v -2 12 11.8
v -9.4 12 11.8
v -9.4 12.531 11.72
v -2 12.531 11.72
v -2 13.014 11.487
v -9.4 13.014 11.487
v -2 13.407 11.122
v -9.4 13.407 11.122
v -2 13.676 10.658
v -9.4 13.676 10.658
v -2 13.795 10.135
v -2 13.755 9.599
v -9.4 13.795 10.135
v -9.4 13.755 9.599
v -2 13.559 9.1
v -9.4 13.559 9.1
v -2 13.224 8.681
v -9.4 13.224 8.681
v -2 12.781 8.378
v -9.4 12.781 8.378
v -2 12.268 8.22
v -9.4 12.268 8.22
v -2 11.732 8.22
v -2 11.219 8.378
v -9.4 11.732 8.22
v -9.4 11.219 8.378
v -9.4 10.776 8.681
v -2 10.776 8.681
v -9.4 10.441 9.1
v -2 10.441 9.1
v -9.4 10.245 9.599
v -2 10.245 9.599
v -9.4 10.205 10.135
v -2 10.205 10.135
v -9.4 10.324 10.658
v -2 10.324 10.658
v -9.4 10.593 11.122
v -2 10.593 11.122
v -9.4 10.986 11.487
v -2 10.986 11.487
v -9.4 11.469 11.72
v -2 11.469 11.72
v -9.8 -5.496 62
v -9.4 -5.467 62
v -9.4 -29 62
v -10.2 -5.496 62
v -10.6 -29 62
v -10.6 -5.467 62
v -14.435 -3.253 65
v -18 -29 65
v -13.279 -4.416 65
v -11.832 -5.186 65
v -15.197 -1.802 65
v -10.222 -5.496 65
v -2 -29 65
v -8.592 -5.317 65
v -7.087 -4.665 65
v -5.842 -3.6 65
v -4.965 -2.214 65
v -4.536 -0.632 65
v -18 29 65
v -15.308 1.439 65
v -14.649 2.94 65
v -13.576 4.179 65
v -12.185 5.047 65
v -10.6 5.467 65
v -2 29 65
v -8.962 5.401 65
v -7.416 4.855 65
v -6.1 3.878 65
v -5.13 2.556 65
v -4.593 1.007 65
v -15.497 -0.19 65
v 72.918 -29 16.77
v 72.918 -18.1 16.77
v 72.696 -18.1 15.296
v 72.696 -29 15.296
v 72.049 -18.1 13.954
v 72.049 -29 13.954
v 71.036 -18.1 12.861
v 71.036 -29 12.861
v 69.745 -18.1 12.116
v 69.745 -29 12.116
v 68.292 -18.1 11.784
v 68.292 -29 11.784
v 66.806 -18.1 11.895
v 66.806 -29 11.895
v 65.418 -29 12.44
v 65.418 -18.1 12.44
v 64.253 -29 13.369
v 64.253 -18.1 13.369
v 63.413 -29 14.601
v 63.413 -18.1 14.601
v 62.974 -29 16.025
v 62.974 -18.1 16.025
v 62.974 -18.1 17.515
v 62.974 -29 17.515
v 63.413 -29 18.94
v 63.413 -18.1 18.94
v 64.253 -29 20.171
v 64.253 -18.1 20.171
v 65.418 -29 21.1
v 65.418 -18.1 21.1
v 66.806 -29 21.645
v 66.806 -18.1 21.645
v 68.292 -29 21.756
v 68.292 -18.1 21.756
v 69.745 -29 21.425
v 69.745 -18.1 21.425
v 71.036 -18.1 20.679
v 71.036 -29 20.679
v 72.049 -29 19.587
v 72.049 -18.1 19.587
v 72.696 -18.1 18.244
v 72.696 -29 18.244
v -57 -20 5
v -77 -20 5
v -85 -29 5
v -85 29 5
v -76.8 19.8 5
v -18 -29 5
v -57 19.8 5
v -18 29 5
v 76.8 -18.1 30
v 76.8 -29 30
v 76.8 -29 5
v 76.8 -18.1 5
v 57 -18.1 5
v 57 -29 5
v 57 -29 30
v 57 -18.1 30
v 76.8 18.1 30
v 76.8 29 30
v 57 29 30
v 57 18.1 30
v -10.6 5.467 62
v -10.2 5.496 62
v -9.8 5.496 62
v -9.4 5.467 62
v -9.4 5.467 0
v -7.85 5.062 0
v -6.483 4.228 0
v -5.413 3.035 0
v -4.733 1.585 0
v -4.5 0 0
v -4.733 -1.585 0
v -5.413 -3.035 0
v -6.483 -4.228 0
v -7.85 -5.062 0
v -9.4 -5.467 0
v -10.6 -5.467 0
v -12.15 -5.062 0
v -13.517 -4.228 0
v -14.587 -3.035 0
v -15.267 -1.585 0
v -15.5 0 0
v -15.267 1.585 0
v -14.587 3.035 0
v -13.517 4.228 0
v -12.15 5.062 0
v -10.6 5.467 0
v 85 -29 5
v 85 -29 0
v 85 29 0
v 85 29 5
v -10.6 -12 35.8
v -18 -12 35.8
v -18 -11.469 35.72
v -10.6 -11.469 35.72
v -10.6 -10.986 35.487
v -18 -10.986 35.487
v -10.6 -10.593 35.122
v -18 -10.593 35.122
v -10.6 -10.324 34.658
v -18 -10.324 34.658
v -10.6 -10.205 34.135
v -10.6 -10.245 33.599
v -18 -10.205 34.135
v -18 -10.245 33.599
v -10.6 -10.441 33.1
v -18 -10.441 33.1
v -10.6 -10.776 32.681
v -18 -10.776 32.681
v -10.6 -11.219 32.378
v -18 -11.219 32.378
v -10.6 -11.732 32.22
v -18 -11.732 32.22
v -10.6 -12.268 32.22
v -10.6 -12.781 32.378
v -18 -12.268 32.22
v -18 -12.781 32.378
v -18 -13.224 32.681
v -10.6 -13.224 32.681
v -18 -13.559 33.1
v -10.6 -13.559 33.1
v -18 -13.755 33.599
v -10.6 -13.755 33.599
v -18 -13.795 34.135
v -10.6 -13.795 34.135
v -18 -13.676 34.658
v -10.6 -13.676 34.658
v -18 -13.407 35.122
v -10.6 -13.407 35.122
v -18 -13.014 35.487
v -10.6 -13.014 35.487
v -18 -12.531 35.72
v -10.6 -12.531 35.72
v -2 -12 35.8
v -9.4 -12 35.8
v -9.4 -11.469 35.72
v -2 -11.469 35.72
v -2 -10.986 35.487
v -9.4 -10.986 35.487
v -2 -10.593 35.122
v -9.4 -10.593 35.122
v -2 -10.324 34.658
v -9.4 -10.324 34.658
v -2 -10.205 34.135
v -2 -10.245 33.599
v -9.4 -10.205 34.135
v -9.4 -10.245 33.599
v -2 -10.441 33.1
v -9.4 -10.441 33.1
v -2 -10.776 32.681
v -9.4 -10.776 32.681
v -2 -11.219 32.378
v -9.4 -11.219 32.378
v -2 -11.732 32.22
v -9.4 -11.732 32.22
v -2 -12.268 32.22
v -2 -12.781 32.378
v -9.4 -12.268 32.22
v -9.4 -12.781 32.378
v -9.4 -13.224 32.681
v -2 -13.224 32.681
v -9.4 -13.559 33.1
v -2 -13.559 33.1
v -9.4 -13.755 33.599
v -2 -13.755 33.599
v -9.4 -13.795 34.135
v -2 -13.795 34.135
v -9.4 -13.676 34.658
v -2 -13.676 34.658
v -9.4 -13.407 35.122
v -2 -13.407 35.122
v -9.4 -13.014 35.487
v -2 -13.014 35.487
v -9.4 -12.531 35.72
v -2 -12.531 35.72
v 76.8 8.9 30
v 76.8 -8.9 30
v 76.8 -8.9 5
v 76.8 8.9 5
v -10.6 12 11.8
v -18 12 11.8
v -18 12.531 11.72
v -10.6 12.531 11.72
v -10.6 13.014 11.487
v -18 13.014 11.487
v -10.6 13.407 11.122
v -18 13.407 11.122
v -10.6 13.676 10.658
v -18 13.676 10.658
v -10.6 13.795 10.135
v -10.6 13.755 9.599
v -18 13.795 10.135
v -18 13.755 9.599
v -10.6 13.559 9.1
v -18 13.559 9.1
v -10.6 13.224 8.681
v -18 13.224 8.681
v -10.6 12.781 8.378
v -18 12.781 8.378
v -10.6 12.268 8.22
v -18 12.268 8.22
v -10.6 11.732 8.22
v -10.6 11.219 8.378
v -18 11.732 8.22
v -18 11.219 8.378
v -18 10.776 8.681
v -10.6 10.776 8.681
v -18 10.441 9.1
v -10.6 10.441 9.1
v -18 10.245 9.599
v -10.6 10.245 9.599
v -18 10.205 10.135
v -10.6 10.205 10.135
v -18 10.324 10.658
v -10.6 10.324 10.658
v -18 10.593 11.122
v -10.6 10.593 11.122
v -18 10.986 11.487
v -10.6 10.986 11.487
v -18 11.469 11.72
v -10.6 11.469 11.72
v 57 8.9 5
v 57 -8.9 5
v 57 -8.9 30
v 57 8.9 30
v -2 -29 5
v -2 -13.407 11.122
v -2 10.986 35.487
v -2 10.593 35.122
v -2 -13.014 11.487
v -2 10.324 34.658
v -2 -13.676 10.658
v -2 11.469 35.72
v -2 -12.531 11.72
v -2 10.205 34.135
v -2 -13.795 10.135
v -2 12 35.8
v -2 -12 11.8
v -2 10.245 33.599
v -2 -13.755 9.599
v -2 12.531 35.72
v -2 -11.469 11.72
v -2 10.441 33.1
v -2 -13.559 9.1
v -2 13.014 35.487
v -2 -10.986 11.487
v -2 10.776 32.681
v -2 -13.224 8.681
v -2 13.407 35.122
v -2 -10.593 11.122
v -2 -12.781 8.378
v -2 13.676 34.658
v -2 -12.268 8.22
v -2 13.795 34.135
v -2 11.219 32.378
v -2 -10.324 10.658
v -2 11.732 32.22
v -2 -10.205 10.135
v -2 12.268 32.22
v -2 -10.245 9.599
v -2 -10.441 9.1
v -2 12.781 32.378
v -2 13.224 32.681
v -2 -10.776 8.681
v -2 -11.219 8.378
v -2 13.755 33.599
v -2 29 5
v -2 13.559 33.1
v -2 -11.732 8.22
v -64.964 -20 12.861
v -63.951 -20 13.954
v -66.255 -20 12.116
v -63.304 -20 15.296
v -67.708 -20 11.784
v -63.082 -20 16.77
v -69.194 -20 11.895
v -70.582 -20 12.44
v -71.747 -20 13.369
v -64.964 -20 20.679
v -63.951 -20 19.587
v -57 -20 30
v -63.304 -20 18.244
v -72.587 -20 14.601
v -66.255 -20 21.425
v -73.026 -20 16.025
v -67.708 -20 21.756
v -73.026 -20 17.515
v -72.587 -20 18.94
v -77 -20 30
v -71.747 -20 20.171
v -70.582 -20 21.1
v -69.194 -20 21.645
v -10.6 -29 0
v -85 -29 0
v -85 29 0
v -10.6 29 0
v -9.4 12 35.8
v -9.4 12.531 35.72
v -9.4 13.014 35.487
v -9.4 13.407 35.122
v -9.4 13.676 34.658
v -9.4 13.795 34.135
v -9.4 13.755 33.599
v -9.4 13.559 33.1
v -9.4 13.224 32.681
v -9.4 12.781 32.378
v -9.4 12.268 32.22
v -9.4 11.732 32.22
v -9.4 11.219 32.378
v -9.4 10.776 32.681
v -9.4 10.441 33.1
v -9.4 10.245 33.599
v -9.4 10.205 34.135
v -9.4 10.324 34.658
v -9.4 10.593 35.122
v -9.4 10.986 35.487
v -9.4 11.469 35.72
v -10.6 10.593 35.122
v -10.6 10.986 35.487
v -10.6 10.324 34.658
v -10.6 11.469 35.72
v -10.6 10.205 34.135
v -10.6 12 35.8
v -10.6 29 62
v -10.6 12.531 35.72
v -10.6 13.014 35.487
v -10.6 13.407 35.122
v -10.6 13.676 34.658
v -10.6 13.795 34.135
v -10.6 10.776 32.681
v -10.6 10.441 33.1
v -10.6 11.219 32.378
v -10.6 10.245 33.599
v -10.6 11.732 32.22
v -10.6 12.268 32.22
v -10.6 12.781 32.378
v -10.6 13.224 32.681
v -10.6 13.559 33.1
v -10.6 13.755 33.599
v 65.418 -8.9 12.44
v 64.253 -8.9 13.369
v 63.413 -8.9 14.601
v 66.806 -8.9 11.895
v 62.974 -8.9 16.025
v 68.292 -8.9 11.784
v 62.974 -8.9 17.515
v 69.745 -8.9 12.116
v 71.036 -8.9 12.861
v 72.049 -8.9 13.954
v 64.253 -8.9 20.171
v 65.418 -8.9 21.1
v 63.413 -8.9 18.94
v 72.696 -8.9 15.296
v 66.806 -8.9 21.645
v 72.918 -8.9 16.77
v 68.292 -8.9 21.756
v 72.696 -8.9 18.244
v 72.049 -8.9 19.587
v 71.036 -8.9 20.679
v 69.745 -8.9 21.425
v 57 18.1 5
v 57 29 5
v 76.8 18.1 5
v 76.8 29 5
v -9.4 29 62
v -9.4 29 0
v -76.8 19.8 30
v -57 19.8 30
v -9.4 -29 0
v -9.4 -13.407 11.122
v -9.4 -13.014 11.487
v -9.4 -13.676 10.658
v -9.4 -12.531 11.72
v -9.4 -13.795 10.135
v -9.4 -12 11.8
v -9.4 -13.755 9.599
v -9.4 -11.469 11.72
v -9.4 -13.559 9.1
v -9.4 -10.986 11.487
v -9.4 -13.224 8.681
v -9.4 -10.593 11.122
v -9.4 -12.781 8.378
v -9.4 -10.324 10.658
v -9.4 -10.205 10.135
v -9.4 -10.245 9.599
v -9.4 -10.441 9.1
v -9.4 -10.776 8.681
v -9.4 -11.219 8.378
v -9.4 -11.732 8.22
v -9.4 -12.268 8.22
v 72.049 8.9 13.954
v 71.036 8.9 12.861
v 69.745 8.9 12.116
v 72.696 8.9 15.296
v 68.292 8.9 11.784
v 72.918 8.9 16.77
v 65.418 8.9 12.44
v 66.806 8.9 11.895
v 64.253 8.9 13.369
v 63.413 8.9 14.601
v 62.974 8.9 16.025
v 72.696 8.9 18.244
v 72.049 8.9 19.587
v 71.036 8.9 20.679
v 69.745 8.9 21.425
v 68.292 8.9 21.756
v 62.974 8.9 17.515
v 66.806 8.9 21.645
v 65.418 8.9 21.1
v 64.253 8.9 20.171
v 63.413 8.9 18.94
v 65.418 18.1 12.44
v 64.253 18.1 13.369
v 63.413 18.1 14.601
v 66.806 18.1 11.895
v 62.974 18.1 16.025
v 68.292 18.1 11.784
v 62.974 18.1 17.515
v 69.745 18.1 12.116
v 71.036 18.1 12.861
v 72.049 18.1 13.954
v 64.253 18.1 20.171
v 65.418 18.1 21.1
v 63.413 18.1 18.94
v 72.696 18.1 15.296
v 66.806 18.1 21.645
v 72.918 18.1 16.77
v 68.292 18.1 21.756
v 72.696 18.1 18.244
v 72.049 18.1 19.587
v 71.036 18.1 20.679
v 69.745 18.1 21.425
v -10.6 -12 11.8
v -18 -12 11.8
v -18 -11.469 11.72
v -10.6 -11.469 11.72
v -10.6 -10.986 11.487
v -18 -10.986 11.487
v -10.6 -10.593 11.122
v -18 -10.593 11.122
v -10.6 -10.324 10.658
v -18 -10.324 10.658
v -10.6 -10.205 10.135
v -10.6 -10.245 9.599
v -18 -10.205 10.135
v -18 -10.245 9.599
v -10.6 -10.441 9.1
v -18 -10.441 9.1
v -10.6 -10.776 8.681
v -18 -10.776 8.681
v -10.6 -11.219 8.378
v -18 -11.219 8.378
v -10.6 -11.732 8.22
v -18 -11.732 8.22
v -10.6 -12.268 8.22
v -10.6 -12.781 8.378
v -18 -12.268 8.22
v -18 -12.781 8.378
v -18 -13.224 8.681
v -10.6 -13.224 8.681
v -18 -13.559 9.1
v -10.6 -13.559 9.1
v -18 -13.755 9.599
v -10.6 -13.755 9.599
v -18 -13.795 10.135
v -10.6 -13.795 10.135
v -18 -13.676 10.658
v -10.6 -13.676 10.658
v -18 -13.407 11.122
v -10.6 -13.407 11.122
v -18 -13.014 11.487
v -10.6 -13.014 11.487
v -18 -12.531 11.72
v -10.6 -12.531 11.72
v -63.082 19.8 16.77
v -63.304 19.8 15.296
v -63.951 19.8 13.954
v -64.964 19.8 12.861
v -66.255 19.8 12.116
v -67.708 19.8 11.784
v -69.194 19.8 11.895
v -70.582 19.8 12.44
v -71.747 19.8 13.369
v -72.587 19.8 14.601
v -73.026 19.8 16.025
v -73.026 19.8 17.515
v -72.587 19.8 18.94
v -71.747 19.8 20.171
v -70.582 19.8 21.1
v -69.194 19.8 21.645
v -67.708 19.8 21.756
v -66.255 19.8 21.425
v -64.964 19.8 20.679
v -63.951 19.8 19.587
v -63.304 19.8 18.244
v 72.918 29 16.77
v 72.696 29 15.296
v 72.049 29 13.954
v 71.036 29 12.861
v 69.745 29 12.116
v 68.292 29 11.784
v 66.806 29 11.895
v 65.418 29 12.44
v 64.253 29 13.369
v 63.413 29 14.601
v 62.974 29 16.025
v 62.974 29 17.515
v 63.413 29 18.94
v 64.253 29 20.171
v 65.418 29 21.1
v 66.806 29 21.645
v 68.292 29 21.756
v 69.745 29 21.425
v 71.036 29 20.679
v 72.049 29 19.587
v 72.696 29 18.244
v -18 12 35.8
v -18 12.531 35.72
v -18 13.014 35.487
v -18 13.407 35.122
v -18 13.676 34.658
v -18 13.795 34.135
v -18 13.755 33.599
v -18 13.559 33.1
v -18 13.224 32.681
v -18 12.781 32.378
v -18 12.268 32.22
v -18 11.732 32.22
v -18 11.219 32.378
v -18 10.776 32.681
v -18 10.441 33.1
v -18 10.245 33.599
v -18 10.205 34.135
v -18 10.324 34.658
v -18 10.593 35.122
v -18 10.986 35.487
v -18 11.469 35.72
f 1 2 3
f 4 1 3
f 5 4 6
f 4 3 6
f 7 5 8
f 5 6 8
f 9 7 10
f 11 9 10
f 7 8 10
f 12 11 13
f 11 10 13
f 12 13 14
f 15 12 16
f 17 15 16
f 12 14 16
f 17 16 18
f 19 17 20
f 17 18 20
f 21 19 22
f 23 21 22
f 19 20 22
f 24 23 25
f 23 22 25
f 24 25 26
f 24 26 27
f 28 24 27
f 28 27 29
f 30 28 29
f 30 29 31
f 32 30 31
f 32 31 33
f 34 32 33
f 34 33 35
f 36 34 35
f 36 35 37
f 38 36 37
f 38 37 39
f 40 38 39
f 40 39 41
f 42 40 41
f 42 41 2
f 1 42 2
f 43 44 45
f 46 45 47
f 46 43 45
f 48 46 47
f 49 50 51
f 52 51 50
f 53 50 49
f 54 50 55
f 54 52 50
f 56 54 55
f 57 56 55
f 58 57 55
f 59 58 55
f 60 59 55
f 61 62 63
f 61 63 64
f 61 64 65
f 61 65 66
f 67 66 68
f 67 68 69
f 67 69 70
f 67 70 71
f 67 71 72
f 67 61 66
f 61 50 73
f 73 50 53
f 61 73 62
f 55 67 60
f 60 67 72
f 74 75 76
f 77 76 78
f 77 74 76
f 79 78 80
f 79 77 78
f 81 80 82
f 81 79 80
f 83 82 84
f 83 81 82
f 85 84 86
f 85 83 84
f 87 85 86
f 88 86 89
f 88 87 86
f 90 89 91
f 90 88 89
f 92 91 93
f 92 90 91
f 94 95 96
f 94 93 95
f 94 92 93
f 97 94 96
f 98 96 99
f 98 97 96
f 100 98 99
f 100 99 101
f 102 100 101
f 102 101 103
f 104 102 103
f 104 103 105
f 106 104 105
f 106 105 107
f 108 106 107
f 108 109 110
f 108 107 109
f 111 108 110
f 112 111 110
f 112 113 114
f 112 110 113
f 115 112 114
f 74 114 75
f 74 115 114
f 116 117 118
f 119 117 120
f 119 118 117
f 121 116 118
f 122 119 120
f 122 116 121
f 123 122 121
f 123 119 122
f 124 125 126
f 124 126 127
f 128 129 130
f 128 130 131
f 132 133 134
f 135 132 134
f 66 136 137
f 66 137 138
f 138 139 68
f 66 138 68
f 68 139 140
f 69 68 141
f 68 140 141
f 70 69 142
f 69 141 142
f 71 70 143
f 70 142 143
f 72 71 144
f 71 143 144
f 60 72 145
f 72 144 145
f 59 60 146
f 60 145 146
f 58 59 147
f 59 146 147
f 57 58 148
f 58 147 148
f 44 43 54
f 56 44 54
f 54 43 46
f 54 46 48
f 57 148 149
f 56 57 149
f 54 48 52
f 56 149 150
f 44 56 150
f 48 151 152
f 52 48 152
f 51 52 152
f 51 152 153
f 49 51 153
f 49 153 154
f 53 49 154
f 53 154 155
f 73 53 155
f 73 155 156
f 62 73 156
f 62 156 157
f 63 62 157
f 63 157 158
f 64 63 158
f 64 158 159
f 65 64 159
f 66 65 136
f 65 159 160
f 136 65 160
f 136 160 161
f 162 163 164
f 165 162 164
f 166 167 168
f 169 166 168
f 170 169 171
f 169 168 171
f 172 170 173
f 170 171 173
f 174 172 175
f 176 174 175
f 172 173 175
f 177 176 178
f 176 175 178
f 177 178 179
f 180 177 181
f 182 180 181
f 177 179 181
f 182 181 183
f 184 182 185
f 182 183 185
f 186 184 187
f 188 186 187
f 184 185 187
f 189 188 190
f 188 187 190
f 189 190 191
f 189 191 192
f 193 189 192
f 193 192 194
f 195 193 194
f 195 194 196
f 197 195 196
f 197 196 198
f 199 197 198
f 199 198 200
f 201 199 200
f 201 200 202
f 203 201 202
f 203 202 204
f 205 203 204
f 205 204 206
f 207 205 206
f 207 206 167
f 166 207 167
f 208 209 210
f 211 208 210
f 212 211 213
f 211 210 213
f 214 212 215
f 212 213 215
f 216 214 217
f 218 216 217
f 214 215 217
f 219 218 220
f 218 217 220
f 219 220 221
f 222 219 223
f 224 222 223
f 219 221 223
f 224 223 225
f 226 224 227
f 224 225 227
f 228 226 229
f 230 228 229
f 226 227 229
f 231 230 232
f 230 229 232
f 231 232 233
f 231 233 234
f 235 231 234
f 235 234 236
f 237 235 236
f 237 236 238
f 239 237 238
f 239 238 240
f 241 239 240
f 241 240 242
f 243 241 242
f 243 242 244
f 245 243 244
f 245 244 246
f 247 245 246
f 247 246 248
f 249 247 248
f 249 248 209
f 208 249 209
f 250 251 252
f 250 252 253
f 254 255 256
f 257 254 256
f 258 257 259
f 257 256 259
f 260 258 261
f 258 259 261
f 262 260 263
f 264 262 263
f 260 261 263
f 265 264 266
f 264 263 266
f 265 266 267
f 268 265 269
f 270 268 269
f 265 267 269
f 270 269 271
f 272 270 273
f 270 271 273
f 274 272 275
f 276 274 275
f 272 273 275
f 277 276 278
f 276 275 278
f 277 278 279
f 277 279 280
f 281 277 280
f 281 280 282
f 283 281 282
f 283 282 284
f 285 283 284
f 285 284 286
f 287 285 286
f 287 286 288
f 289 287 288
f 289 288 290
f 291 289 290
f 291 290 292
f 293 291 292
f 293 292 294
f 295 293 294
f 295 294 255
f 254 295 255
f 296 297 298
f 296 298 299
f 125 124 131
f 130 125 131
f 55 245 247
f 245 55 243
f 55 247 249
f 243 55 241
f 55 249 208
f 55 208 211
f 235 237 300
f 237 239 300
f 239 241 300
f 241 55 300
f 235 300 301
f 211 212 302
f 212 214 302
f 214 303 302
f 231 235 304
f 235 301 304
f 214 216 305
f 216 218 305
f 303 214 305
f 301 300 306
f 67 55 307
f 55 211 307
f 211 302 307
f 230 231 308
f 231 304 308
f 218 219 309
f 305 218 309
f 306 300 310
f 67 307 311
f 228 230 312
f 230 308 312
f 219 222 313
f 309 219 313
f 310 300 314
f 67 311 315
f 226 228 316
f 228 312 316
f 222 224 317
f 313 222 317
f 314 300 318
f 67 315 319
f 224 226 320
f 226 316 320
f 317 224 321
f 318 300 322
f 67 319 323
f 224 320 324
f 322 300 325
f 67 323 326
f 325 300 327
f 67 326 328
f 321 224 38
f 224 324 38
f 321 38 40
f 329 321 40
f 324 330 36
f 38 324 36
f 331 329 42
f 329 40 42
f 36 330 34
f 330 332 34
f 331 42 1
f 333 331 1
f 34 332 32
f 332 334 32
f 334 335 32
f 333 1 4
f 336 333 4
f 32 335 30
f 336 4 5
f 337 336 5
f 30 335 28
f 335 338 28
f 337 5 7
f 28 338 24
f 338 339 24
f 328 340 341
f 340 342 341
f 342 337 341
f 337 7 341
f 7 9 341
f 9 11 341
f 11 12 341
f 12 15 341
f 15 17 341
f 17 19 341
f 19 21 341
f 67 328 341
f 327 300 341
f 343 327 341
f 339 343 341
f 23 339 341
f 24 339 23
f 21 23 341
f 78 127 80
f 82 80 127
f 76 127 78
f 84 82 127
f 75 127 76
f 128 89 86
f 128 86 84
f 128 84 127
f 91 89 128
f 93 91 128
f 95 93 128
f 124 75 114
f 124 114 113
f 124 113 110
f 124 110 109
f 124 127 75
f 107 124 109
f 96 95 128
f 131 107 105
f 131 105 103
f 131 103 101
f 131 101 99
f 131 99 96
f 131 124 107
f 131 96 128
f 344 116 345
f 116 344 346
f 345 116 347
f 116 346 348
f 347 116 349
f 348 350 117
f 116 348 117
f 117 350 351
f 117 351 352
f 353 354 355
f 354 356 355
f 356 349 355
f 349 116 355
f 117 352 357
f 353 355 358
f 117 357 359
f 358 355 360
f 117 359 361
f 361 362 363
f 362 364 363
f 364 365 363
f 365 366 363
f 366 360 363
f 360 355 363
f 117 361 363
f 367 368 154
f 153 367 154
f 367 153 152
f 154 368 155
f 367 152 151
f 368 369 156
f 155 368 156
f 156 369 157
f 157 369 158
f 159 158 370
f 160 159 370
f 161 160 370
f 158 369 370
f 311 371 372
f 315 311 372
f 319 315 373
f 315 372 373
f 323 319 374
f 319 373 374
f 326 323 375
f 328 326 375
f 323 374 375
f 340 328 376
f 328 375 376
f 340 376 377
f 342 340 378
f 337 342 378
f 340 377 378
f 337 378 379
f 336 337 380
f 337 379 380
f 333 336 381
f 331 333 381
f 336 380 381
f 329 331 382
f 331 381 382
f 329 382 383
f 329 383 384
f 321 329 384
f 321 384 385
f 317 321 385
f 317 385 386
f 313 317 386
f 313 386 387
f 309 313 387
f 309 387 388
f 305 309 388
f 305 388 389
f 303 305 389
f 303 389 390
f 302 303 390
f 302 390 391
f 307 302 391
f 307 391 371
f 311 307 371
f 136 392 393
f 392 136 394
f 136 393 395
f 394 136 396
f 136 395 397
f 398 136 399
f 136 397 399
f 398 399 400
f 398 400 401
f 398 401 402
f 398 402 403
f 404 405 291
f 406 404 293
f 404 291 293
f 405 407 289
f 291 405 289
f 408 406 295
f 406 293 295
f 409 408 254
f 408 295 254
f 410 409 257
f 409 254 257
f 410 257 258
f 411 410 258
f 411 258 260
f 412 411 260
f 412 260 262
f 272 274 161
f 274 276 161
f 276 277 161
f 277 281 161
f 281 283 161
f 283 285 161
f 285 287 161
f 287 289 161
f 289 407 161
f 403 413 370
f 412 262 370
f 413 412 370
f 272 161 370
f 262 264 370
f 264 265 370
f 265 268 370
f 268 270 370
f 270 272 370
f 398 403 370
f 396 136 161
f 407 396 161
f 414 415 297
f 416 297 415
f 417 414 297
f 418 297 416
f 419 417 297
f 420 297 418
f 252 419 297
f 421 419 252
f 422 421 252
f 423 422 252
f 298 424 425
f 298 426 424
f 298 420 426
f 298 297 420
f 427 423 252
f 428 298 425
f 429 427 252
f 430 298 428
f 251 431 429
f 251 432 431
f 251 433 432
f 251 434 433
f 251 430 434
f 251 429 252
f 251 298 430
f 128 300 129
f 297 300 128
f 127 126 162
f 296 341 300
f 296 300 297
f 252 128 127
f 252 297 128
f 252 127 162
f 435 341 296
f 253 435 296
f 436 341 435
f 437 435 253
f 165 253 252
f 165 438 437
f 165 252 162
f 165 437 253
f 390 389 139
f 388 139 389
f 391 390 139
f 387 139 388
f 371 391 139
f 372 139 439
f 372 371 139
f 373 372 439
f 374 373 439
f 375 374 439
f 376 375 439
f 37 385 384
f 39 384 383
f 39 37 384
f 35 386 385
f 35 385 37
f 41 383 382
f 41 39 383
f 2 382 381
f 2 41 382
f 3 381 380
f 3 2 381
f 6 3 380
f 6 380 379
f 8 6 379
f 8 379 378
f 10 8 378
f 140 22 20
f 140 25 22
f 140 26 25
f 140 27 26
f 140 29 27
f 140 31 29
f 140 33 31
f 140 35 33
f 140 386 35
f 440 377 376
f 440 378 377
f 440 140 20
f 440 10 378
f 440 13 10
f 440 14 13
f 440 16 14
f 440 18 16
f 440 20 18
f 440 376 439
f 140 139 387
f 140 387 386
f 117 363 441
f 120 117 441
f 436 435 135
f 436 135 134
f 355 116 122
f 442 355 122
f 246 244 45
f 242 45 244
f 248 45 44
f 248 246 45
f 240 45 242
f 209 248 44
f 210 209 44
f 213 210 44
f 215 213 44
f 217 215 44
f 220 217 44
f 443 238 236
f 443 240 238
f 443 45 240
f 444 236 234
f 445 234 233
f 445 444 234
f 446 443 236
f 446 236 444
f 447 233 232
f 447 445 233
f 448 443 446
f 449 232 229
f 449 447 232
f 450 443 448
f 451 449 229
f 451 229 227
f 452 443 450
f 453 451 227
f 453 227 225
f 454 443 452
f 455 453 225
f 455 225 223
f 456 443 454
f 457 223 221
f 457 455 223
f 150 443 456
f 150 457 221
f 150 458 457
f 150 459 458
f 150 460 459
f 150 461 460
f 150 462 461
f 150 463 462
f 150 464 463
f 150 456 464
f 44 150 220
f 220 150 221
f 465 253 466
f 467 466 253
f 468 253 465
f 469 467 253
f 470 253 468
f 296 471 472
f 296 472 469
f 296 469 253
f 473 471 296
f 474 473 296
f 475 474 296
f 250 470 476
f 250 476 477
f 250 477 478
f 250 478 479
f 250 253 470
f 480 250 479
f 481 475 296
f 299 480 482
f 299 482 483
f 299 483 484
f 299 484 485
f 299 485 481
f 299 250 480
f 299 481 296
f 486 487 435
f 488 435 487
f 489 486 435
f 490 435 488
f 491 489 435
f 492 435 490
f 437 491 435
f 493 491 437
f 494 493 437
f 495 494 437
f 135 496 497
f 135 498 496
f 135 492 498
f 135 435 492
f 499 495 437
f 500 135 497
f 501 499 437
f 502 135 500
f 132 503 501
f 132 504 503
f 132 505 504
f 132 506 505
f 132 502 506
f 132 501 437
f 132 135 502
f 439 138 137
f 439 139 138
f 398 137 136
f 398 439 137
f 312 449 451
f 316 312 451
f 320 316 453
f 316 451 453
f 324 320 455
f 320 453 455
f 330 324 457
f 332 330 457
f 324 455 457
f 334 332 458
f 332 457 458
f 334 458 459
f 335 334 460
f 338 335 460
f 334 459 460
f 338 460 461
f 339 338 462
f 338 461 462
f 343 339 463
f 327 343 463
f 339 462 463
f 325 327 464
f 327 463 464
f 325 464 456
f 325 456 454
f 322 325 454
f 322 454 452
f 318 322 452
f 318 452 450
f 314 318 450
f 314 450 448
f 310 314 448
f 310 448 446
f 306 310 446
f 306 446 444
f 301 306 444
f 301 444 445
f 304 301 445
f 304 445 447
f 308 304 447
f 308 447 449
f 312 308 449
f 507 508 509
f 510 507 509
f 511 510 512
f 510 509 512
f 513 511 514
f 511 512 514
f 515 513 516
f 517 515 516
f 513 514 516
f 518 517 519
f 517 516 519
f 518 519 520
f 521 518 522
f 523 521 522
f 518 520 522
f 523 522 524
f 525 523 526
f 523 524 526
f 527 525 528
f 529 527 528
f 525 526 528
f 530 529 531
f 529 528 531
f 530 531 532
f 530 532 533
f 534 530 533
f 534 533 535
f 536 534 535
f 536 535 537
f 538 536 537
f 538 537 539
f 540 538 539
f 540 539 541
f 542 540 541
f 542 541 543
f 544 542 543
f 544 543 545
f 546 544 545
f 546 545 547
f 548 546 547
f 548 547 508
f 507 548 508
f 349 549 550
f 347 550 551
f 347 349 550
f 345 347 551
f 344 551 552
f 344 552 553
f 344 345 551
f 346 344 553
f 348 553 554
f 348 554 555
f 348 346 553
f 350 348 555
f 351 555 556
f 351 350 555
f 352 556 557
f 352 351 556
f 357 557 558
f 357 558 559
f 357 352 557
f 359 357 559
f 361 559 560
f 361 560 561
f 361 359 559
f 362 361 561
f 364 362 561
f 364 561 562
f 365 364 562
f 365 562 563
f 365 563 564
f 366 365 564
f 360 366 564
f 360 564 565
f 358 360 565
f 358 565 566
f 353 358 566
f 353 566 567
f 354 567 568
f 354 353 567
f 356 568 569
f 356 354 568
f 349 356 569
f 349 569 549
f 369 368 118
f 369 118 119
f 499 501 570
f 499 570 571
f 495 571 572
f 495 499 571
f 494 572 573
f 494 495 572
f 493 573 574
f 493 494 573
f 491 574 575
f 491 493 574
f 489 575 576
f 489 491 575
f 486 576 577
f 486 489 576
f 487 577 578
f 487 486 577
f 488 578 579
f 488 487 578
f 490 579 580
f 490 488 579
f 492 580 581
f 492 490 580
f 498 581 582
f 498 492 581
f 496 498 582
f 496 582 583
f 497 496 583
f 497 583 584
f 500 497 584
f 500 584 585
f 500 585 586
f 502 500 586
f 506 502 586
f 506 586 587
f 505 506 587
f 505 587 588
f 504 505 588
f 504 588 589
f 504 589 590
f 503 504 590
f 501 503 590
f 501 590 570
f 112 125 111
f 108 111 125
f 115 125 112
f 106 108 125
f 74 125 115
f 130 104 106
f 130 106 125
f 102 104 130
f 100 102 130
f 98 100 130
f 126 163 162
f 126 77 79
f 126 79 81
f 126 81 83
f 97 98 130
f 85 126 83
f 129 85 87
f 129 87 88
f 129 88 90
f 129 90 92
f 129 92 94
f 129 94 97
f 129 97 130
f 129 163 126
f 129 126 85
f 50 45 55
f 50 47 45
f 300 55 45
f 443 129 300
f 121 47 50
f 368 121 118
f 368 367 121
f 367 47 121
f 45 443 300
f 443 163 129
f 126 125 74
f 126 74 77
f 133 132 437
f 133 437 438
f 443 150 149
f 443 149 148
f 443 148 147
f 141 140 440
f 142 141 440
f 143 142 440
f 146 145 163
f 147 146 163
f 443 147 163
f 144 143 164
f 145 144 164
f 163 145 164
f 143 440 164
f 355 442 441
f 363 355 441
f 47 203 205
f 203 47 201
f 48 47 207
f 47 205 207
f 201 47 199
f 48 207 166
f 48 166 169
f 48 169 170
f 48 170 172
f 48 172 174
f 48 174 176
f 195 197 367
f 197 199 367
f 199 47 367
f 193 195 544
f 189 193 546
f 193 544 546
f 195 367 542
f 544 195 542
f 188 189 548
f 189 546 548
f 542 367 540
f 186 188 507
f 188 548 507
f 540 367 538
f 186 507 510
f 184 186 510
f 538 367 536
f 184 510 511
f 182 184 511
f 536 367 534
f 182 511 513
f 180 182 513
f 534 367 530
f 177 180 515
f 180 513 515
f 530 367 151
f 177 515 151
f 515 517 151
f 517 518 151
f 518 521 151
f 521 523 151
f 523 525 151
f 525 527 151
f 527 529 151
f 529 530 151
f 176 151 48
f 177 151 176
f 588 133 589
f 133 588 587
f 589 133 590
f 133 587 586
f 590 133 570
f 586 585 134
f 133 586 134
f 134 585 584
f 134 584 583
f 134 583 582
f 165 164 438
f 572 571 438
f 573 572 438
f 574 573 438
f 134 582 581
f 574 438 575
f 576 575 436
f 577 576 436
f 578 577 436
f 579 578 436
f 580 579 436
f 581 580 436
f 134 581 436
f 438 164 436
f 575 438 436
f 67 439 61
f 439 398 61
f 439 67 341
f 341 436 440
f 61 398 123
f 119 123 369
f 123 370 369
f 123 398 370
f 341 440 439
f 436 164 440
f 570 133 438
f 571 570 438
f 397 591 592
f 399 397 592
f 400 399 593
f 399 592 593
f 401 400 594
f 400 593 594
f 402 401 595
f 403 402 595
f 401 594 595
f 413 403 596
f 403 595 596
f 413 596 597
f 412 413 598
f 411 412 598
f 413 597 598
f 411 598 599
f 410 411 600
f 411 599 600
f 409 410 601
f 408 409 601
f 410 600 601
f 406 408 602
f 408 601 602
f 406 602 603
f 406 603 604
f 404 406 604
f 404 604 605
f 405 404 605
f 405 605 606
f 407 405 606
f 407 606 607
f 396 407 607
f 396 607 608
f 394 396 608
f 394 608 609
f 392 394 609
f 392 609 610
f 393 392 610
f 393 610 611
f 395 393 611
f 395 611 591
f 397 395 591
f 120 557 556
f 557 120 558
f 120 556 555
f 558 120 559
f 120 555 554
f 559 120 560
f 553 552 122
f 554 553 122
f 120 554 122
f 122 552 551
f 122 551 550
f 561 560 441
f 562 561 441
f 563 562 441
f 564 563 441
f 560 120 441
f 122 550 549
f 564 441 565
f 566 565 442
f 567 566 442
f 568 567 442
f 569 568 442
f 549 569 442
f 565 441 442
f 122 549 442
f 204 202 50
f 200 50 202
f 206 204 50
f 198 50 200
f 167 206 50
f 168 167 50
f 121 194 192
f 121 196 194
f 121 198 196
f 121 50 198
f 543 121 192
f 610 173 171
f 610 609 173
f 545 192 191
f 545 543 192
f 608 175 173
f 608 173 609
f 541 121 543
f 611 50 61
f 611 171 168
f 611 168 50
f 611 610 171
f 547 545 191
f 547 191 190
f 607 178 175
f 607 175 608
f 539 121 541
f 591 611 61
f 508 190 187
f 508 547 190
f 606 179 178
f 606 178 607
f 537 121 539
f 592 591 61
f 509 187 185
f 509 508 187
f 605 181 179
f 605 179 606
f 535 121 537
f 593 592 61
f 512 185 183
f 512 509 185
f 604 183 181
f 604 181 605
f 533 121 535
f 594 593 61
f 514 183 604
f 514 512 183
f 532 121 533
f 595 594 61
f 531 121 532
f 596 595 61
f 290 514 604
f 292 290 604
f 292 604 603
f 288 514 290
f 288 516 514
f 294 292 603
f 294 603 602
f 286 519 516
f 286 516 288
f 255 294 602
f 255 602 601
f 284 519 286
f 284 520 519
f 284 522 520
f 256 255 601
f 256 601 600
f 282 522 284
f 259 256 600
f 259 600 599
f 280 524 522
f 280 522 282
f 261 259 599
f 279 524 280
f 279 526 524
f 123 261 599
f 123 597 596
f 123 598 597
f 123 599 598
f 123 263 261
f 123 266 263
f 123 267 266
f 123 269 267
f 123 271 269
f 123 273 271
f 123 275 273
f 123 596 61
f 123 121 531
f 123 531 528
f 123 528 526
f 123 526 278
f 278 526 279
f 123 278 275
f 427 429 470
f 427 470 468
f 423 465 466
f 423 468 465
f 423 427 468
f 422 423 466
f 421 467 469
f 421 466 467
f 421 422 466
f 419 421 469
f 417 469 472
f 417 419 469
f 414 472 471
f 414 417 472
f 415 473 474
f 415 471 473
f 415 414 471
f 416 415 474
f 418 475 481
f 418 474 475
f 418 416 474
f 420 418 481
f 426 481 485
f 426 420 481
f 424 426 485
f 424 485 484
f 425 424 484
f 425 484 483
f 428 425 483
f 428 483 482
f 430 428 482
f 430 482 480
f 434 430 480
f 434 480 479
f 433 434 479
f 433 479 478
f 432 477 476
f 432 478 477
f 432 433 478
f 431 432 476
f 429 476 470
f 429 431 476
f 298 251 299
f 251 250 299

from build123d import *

# Parameters (mm, degrees)
SKETCH1_W           = 170
SKETCH1_H           = 58
BOSS_EXTRUDE1_DEPTH = 5
SKETCH2_W           = 28
SKETCH2_H           = 58
BOSS_EXTRUDE2_DEPTH = 25
CUT_EXTRUDE4_DEPTH  = 25
HOLE1_START         = -29
HOLE1_OUTLINE_R     = 5
HOLE1_DEPTH         = 58
SKETCH6_W           = 16
SKETCH6_H           = 58
BOSS_EXTRUDE3_DEPTH = 60
SKETCH7_W           = 1.2
SKETCH7_H           = 58
CUT_EXTRUDE5_DEPTH  = 62
SKETCH8_R           = 5.5
CUT_EXTRUDE6_DEPTH  = 100
SKETCH9_R           = 1.8
CUT_EXTRUDE7_DEPTH  = 20
HOLE3_START         = -20
HOLE3_OUTLINE_R     = 5
HOLE3_DEPTH         = 39.8


# Read off the part's stored shape, not the designer's step: Hole1, Hole3
with BuildPart() as part:
    # Sketch1 → Boss-Extrude1 (new body)
    with BuildSketch(Plane.XY):
        Rectangle(SKETCH1_W, SKETCH1_H)
    extrude(amount=BOSS_EXTRUDE1_DEPTH)

    # Sketch2 → Boss-Extrude2 (add)
    with BuildSketch(Plane(origin=(0, 0, 5), x_dir=(-1, 0, 0), z_dir=(0, 0, -1))):
        with Locations((71, 0)):
            Rectangle(SKETCH2_W, SKETCH2_H)
        with Locations((-71, 0)):
            Rectangle(SKETCH2_W, SKETCH2_H)
    extrude(amount=-BOSS_EXTRUDE2_DEPTH)

    # Sketch3 → Cut-Extrude4 (cut)
    with BuildSketch(Plane.XY.offset(30)):
        Polygon((-57, -29), (-57, -20), (-77, -20), (-76.8, 19.8), (-57, 19.8), (-57, 29), (-85, 29), (-85, -29), align=None)
        Polygon((56, 8.9), (56, 18.1), (76.8, 18.1), (76.8, 29), (85, 29), (85, -29), (76.8, -29), (76.8, -18.1), (56, -18.1), (56, -8.9), (76.8, -8.9), (76.8, 8.9), align=None)
    extrude(amount=-CUT_EXTRUDE4_DEPTH, mode=Mode.SUBTRACT)

    # Hole1 outline → Hole1 (cut)
    with BuildSketch(Plane(origin=(0, 0, 0), x_dir=(1, 0, 0), z_dir=(0, 1, 0)).offset(HOLE1_START)):
        with Locations((67.918134457, -16.770132162)):
            Circle(HOLE1_OUTLINE_R)
    extrude(amount=HOLE1_DEPTH, mode=Mode.SUBTRACT)

    # Sketch6 → Boss-Extrude3 (add)
    with BuildSketch(Plane.XY.offset(5)):
        with Locations((-10, 0)):
            Rectangle(SKETCH6_W, SKETCH6_H)
    extrude(amount=BOSS_EXTRUDE3_DEPTH)

    # Sketch7 → Cut-Extrude5 (cut)
    with BuildSketch(Plane(origin=(0, 0, 0), x_dir=(-1, 0, 0), z_dir=(0, 0, -1))):
        with Locations((10, 0)):
            Rectangle(SKETCH7_W, SKETCH7_H)
    extrude(amount=-CUT_EXTRUDE5_DEPTH, mode=Mode.SUBTRACT)

    # Sketch8 → Cut-Extrude6 (cut)
    with BuildSketch(Plane(origin=(0, 0, 0), x_dir=(-1, 0, 0), z_dir=(0, 0, -1))):
        with Locations(Location((10, 0, 0), (0, 0, 83.737086874))):
            Circle(SKETCH8_R)
    extrude(amount=-CUT_EXTRUDE6_DEPTH, mode=Mode.SUBTRACT)

    # Sketch9 → Cut-Extrude7 (cut)
    with BuildSketch(Plane.ZY.offset(18)):
        with Locations((34, 12)):
            Circle(SKETCH9_R)
        with Locations((10, 12)):
            Circle(SKETCH9_R)
        with Locations((10, -12)):
            Circle(SKETCH9_R)
        with Locations((34, -12)):
            Circle(SKETCH9_R)
    extrude(amount=-CUT_EXTRUDE7_DEPTH, mode=Mode.SUBTRACT)

    # Hole3 outline → Hole3 (cut)
    with BuildSketch(Plane(origin=(0, 0, 0), x_dir=(1, 0, 0), z_dir=(0, 1, 0)).offset(HOLE3_START)):
        with Locations((-68.081865543, -16.770132162)):
            Circle(HOLE3_OUTLINE_R)
    extrude(amount=HOLE3_DEPTH, mode=Mode.SUBTRACT)


solid = part.part
